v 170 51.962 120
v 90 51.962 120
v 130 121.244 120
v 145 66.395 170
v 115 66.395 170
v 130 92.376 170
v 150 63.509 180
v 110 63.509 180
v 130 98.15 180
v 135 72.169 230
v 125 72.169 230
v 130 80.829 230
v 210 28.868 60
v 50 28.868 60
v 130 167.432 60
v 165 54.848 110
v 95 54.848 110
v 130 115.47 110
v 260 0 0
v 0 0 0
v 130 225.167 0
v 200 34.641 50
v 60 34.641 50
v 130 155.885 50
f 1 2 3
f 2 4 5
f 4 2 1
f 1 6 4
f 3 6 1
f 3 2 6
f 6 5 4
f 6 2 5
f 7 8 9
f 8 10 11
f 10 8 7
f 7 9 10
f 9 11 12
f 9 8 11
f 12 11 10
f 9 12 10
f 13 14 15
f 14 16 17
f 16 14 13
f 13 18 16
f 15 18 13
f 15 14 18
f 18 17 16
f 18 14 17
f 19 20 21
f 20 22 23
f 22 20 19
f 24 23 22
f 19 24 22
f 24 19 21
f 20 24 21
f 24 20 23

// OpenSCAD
$fn = 100;

step_between = 10;
height = 50;

base1 = 260;
top1 = 140;

base2 = 160;
top2 = 70;

base3 = 80;
top3 = 30;

base4 = 40;
top4 = 10;


module stage (a, b, z) {
    h1 = sqrt(a^2 - (a/2)^2);
    h2 = sqrt(b^2 - (b/2)^2);
    
    echo("h1 is ", h1);
    echo("h2 is ", h2);
    
    A2_x = (a - b) / 2;
    A2_y = h1 / 3 - h2 / 3; // Center the top triangle in y
    
    B2_x = A2_x + b;
    B2_y = A2_y;
    
    C2_x = A2_x + b/2;
    C2_y = A2_y + h2;

    polyhedron(
            [
                [0, 0, 0],
                [a/2, h1, 0],
                [a, 0, 0],
                [A2_x, A2_y, z],
                [C2_x, C2_y, z],
                [B2_x, B2_y, z],
            ],
            [
                [2, 1, 0], // bottom
                [3, 4, 5], // top
                [1, 4, 3, 0],
                [2, 5, 4, 1],
                [0, 3, 5, 2],
            ]
    );
}
    

stage(base1, top1, height);

h1 = sqrt(base1^2 - (base1/2)^2);
h2 = sqrt(base2^2 - (base2/2)^2);

h3 = sqrt(base3^2 - (base3/2)^2);
h4 = sqrt(base4^2 - (base4/2)^2);

translate([(base1 - base2) / 2, (h1 - h2)/3, height + step_between]) {
    stage(base2, top2, height);
    translate([(base2 - base3) / 2, (h2 - h3) / 3, height + step_between]) {
        stage(base3, top3, height);
        translate([(base3 - base4) /2 , (h3 - h4) / 3, height + step_between]) {
            stage(base4, top4, height);
        }
    }
}
